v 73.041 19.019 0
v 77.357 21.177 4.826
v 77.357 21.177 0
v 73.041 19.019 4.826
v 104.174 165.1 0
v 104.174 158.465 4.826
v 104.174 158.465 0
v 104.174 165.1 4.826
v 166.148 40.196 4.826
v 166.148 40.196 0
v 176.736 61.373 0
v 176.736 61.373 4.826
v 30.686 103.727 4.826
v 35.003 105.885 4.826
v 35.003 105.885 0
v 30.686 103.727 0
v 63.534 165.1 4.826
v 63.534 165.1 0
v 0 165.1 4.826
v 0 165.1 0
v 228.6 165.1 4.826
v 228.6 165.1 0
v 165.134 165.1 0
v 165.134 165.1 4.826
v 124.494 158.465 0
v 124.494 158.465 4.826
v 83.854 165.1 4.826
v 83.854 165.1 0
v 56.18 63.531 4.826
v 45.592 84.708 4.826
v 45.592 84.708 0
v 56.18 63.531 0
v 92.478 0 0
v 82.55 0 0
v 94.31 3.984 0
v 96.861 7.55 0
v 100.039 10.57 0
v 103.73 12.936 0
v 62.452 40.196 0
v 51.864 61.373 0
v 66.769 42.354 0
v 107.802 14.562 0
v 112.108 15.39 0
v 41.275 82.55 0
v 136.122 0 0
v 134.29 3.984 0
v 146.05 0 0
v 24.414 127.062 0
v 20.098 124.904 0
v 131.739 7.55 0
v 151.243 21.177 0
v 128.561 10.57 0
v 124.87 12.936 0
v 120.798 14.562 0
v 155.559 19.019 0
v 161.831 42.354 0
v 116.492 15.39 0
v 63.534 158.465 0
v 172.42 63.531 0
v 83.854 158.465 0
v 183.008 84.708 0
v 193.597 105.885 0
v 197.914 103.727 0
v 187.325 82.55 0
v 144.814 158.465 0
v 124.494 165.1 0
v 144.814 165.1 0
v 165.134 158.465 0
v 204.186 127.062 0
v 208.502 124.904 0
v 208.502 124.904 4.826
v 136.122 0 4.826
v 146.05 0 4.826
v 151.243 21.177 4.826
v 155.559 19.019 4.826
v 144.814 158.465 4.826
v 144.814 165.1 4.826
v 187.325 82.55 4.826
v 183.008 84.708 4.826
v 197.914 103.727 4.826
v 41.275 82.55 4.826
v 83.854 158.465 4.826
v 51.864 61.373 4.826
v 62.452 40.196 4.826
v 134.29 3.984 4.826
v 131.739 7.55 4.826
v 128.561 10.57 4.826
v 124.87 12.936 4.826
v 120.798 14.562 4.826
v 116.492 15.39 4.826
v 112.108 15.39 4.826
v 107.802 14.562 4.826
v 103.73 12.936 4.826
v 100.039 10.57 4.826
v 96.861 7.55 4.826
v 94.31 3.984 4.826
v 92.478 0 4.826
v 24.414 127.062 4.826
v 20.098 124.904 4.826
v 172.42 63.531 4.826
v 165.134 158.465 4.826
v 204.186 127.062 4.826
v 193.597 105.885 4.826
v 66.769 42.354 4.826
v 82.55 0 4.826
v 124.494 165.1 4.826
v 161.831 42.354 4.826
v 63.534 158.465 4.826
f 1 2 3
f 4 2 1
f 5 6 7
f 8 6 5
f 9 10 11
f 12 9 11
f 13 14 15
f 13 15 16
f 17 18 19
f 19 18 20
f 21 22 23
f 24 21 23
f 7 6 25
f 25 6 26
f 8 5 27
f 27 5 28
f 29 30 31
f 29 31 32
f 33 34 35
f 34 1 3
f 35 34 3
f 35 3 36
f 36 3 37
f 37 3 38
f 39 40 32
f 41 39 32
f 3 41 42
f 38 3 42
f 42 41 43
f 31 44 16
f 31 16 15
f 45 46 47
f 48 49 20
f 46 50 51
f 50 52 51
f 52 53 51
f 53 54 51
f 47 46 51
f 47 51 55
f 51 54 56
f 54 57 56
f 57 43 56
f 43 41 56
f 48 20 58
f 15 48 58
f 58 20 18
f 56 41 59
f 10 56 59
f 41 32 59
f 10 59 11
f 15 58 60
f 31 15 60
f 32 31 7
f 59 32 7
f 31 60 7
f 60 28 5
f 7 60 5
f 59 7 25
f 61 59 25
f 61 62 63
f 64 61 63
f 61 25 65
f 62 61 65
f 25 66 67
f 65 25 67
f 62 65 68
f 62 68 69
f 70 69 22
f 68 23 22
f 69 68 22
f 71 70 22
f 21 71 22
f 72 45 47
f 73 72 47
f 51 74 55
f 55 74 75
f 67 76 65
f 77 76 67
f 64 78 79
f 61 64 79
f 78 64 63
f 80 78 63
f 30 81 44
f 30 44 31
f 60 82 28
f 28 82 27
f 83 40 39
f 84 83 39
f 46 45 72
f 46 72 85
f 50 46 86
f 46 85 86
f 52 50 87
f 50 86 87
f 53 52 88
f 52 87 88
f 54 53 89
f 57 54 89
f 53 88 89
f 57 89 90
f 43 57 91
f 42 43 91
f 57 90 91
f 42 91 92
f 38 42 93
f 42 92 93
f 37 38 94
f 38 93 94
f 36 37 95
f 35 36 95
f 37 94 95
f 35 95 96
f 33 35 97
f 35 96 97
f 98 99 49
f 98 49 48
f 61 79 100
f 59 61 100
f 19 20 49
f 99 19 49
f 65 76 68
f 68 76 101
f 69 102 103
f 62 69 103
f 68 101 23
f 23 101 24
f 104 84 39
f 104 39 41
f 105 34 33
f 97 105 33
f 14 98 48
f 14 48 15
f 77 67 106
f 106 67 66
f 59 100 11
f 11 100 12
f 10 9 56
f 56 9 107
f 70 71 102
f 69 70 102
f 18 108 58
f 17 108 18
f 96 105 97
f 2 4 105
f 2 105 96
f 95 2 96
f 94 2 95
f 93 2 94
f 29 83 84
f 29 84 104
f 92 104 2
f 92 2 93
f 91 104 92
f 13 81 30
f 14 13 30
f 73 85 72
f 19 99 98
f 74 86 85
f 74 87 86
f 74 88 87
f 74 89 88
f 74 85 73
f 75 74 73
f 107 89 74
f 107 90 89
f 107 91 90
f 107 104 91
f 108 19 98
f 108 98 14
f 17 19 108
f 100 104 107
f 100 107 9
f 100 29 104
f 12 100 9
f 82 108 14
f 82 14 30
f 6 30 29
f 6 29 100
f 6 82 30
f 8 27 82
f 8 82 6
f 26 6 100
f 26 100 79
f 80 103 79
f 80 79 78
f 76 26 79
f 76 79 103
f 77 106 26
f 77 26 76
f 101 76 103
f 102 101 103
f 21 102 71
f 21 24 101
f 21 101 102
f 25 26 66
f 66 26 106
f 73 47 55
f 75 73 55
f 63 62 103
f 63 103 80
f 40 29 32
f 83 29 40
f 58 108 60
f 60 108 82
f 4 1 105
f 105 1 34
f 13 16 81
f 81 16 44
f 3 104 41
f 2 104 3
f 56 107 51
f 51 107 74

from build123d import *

# Parameters (mm, degrees)
BOSS_EXTRUDE1_DEPTH = 4.826
CUT_EXTRUDE1_DEPTH  = 283.027055929
SKETCH3_R           = 23.114
CUT_EXTRUDE2_DEPTH  = 4.826
SKETCH4_W           = 20.32
SKETCH4_H           = 4.617249963
CUT_EXTRUDE3_DEPTH  = 283.027055929
SKETCH5_W           = 20.32
SKETCH5_H           = 4.826
CUT_EXTRUDE4_DEPTH  = 283.027055929


with BuildPart() as part:
    # Sketch1 → Boss-Extrude1 (new body)
    with BuildSketch(Plane.XY):
        Polygon((228.6, 165.1), (0, 165.1), (82.55, 0), (146.05, 0), align=None)
    extrude(amount=BOSS_EXTRUDE1_DEPTH)

    # Sketch2 → Cut-Extrude1 (cut, through all)
    with BuildSketch(Plane.XY.offset(4.826)):
        Polygon((20.097936797, 124.904126406), (24.414442421, 127.062379218), (35.002974022, 105.885316015), (30.686468399, 103.727063203), align=None)
        Polygon((41.275, 82.55), (45.591505624, 84.708252812), (56.180037225, 63.531189609), (51.863531601, 61.372936797), align=None)
        Polygon((62.452063203, 40.195873594), (66.768568827, 42.354126406), (77.357100428, 21.177063203), (73.040594804, 19.018810391), align=None)
        Polygon((155.559405196, 19.018810391), (166.147936797, 40.195873594), (161.831431173, 42.354126406), (151.242899572, 21.177063203), align=None)
        Polygon((176.736468399, 61.372936797), (187.325, 82.55), (183.008494376, 84.708252812), (172.419962775, 63.531189609), align=None)
        Polygon((197.913531601, 103.727063203), (208.502063203, 124.904126406), (204.185557579, 127.062379218), (193.597025978, 105.885316015), align=None)
    extrude(amount=-CUT_EXTRUDE1_DEPTH, mode=Mode.SUBTRACT)

    # Sketch3 → Cut-Extrude2 (cut)
    with BuildSketch(Plane.XY.offset(4.826)):
        with Locations((114.3, -7.62)):
            Circle(SKETCH3_R)
    extrude(amount=-CUT_EXTRUDE2_DEPTH, mode=Mode.SUBTRACT)

    # Sketch4 → Cut-Extrude3 (cut, through all)
    with BuildSketch(Plane.XY.offset(4.826)):
        with Locations((154.974498273, 165.599419735)):
            Rectangle(SKETCH4_W, SKETCH4_H)
        with Locations((114.334498273, 165.599419735)):
            Rectangle(SKETCH4_W, SKETCH4_H)
        with Locations((73.694498273, 165.599419735)):
            Rectangle(SKETCH4_W, SKETCH4_H)
    extrude(amount=-CUT_EXTRUDE3_DEPTH, mode=Mode.SUBTRACT)

    # Sketch5 → Cut-Extrude4 (cut, through all)
    with BuildSketch(Plane.XY.offset(4.826)):
        with Locations((154.974498273, 160.877794753)):
            Rectangle(SKETCH5_W, SKETCH5_H)
        with Locations((114.334498273, 160.877794753)):
            Rectangle(SKETCH5_W, SKETCH5_H)
        with Locations((73.694498273, 160.877794753)):
            Rectangle(SKETCH5_W, SKETCH5_H)
    extrude(amount=-CUT_EXTRUDE4_DEPTH, mode=Mode.SUBTRACT)


solid = part.part
